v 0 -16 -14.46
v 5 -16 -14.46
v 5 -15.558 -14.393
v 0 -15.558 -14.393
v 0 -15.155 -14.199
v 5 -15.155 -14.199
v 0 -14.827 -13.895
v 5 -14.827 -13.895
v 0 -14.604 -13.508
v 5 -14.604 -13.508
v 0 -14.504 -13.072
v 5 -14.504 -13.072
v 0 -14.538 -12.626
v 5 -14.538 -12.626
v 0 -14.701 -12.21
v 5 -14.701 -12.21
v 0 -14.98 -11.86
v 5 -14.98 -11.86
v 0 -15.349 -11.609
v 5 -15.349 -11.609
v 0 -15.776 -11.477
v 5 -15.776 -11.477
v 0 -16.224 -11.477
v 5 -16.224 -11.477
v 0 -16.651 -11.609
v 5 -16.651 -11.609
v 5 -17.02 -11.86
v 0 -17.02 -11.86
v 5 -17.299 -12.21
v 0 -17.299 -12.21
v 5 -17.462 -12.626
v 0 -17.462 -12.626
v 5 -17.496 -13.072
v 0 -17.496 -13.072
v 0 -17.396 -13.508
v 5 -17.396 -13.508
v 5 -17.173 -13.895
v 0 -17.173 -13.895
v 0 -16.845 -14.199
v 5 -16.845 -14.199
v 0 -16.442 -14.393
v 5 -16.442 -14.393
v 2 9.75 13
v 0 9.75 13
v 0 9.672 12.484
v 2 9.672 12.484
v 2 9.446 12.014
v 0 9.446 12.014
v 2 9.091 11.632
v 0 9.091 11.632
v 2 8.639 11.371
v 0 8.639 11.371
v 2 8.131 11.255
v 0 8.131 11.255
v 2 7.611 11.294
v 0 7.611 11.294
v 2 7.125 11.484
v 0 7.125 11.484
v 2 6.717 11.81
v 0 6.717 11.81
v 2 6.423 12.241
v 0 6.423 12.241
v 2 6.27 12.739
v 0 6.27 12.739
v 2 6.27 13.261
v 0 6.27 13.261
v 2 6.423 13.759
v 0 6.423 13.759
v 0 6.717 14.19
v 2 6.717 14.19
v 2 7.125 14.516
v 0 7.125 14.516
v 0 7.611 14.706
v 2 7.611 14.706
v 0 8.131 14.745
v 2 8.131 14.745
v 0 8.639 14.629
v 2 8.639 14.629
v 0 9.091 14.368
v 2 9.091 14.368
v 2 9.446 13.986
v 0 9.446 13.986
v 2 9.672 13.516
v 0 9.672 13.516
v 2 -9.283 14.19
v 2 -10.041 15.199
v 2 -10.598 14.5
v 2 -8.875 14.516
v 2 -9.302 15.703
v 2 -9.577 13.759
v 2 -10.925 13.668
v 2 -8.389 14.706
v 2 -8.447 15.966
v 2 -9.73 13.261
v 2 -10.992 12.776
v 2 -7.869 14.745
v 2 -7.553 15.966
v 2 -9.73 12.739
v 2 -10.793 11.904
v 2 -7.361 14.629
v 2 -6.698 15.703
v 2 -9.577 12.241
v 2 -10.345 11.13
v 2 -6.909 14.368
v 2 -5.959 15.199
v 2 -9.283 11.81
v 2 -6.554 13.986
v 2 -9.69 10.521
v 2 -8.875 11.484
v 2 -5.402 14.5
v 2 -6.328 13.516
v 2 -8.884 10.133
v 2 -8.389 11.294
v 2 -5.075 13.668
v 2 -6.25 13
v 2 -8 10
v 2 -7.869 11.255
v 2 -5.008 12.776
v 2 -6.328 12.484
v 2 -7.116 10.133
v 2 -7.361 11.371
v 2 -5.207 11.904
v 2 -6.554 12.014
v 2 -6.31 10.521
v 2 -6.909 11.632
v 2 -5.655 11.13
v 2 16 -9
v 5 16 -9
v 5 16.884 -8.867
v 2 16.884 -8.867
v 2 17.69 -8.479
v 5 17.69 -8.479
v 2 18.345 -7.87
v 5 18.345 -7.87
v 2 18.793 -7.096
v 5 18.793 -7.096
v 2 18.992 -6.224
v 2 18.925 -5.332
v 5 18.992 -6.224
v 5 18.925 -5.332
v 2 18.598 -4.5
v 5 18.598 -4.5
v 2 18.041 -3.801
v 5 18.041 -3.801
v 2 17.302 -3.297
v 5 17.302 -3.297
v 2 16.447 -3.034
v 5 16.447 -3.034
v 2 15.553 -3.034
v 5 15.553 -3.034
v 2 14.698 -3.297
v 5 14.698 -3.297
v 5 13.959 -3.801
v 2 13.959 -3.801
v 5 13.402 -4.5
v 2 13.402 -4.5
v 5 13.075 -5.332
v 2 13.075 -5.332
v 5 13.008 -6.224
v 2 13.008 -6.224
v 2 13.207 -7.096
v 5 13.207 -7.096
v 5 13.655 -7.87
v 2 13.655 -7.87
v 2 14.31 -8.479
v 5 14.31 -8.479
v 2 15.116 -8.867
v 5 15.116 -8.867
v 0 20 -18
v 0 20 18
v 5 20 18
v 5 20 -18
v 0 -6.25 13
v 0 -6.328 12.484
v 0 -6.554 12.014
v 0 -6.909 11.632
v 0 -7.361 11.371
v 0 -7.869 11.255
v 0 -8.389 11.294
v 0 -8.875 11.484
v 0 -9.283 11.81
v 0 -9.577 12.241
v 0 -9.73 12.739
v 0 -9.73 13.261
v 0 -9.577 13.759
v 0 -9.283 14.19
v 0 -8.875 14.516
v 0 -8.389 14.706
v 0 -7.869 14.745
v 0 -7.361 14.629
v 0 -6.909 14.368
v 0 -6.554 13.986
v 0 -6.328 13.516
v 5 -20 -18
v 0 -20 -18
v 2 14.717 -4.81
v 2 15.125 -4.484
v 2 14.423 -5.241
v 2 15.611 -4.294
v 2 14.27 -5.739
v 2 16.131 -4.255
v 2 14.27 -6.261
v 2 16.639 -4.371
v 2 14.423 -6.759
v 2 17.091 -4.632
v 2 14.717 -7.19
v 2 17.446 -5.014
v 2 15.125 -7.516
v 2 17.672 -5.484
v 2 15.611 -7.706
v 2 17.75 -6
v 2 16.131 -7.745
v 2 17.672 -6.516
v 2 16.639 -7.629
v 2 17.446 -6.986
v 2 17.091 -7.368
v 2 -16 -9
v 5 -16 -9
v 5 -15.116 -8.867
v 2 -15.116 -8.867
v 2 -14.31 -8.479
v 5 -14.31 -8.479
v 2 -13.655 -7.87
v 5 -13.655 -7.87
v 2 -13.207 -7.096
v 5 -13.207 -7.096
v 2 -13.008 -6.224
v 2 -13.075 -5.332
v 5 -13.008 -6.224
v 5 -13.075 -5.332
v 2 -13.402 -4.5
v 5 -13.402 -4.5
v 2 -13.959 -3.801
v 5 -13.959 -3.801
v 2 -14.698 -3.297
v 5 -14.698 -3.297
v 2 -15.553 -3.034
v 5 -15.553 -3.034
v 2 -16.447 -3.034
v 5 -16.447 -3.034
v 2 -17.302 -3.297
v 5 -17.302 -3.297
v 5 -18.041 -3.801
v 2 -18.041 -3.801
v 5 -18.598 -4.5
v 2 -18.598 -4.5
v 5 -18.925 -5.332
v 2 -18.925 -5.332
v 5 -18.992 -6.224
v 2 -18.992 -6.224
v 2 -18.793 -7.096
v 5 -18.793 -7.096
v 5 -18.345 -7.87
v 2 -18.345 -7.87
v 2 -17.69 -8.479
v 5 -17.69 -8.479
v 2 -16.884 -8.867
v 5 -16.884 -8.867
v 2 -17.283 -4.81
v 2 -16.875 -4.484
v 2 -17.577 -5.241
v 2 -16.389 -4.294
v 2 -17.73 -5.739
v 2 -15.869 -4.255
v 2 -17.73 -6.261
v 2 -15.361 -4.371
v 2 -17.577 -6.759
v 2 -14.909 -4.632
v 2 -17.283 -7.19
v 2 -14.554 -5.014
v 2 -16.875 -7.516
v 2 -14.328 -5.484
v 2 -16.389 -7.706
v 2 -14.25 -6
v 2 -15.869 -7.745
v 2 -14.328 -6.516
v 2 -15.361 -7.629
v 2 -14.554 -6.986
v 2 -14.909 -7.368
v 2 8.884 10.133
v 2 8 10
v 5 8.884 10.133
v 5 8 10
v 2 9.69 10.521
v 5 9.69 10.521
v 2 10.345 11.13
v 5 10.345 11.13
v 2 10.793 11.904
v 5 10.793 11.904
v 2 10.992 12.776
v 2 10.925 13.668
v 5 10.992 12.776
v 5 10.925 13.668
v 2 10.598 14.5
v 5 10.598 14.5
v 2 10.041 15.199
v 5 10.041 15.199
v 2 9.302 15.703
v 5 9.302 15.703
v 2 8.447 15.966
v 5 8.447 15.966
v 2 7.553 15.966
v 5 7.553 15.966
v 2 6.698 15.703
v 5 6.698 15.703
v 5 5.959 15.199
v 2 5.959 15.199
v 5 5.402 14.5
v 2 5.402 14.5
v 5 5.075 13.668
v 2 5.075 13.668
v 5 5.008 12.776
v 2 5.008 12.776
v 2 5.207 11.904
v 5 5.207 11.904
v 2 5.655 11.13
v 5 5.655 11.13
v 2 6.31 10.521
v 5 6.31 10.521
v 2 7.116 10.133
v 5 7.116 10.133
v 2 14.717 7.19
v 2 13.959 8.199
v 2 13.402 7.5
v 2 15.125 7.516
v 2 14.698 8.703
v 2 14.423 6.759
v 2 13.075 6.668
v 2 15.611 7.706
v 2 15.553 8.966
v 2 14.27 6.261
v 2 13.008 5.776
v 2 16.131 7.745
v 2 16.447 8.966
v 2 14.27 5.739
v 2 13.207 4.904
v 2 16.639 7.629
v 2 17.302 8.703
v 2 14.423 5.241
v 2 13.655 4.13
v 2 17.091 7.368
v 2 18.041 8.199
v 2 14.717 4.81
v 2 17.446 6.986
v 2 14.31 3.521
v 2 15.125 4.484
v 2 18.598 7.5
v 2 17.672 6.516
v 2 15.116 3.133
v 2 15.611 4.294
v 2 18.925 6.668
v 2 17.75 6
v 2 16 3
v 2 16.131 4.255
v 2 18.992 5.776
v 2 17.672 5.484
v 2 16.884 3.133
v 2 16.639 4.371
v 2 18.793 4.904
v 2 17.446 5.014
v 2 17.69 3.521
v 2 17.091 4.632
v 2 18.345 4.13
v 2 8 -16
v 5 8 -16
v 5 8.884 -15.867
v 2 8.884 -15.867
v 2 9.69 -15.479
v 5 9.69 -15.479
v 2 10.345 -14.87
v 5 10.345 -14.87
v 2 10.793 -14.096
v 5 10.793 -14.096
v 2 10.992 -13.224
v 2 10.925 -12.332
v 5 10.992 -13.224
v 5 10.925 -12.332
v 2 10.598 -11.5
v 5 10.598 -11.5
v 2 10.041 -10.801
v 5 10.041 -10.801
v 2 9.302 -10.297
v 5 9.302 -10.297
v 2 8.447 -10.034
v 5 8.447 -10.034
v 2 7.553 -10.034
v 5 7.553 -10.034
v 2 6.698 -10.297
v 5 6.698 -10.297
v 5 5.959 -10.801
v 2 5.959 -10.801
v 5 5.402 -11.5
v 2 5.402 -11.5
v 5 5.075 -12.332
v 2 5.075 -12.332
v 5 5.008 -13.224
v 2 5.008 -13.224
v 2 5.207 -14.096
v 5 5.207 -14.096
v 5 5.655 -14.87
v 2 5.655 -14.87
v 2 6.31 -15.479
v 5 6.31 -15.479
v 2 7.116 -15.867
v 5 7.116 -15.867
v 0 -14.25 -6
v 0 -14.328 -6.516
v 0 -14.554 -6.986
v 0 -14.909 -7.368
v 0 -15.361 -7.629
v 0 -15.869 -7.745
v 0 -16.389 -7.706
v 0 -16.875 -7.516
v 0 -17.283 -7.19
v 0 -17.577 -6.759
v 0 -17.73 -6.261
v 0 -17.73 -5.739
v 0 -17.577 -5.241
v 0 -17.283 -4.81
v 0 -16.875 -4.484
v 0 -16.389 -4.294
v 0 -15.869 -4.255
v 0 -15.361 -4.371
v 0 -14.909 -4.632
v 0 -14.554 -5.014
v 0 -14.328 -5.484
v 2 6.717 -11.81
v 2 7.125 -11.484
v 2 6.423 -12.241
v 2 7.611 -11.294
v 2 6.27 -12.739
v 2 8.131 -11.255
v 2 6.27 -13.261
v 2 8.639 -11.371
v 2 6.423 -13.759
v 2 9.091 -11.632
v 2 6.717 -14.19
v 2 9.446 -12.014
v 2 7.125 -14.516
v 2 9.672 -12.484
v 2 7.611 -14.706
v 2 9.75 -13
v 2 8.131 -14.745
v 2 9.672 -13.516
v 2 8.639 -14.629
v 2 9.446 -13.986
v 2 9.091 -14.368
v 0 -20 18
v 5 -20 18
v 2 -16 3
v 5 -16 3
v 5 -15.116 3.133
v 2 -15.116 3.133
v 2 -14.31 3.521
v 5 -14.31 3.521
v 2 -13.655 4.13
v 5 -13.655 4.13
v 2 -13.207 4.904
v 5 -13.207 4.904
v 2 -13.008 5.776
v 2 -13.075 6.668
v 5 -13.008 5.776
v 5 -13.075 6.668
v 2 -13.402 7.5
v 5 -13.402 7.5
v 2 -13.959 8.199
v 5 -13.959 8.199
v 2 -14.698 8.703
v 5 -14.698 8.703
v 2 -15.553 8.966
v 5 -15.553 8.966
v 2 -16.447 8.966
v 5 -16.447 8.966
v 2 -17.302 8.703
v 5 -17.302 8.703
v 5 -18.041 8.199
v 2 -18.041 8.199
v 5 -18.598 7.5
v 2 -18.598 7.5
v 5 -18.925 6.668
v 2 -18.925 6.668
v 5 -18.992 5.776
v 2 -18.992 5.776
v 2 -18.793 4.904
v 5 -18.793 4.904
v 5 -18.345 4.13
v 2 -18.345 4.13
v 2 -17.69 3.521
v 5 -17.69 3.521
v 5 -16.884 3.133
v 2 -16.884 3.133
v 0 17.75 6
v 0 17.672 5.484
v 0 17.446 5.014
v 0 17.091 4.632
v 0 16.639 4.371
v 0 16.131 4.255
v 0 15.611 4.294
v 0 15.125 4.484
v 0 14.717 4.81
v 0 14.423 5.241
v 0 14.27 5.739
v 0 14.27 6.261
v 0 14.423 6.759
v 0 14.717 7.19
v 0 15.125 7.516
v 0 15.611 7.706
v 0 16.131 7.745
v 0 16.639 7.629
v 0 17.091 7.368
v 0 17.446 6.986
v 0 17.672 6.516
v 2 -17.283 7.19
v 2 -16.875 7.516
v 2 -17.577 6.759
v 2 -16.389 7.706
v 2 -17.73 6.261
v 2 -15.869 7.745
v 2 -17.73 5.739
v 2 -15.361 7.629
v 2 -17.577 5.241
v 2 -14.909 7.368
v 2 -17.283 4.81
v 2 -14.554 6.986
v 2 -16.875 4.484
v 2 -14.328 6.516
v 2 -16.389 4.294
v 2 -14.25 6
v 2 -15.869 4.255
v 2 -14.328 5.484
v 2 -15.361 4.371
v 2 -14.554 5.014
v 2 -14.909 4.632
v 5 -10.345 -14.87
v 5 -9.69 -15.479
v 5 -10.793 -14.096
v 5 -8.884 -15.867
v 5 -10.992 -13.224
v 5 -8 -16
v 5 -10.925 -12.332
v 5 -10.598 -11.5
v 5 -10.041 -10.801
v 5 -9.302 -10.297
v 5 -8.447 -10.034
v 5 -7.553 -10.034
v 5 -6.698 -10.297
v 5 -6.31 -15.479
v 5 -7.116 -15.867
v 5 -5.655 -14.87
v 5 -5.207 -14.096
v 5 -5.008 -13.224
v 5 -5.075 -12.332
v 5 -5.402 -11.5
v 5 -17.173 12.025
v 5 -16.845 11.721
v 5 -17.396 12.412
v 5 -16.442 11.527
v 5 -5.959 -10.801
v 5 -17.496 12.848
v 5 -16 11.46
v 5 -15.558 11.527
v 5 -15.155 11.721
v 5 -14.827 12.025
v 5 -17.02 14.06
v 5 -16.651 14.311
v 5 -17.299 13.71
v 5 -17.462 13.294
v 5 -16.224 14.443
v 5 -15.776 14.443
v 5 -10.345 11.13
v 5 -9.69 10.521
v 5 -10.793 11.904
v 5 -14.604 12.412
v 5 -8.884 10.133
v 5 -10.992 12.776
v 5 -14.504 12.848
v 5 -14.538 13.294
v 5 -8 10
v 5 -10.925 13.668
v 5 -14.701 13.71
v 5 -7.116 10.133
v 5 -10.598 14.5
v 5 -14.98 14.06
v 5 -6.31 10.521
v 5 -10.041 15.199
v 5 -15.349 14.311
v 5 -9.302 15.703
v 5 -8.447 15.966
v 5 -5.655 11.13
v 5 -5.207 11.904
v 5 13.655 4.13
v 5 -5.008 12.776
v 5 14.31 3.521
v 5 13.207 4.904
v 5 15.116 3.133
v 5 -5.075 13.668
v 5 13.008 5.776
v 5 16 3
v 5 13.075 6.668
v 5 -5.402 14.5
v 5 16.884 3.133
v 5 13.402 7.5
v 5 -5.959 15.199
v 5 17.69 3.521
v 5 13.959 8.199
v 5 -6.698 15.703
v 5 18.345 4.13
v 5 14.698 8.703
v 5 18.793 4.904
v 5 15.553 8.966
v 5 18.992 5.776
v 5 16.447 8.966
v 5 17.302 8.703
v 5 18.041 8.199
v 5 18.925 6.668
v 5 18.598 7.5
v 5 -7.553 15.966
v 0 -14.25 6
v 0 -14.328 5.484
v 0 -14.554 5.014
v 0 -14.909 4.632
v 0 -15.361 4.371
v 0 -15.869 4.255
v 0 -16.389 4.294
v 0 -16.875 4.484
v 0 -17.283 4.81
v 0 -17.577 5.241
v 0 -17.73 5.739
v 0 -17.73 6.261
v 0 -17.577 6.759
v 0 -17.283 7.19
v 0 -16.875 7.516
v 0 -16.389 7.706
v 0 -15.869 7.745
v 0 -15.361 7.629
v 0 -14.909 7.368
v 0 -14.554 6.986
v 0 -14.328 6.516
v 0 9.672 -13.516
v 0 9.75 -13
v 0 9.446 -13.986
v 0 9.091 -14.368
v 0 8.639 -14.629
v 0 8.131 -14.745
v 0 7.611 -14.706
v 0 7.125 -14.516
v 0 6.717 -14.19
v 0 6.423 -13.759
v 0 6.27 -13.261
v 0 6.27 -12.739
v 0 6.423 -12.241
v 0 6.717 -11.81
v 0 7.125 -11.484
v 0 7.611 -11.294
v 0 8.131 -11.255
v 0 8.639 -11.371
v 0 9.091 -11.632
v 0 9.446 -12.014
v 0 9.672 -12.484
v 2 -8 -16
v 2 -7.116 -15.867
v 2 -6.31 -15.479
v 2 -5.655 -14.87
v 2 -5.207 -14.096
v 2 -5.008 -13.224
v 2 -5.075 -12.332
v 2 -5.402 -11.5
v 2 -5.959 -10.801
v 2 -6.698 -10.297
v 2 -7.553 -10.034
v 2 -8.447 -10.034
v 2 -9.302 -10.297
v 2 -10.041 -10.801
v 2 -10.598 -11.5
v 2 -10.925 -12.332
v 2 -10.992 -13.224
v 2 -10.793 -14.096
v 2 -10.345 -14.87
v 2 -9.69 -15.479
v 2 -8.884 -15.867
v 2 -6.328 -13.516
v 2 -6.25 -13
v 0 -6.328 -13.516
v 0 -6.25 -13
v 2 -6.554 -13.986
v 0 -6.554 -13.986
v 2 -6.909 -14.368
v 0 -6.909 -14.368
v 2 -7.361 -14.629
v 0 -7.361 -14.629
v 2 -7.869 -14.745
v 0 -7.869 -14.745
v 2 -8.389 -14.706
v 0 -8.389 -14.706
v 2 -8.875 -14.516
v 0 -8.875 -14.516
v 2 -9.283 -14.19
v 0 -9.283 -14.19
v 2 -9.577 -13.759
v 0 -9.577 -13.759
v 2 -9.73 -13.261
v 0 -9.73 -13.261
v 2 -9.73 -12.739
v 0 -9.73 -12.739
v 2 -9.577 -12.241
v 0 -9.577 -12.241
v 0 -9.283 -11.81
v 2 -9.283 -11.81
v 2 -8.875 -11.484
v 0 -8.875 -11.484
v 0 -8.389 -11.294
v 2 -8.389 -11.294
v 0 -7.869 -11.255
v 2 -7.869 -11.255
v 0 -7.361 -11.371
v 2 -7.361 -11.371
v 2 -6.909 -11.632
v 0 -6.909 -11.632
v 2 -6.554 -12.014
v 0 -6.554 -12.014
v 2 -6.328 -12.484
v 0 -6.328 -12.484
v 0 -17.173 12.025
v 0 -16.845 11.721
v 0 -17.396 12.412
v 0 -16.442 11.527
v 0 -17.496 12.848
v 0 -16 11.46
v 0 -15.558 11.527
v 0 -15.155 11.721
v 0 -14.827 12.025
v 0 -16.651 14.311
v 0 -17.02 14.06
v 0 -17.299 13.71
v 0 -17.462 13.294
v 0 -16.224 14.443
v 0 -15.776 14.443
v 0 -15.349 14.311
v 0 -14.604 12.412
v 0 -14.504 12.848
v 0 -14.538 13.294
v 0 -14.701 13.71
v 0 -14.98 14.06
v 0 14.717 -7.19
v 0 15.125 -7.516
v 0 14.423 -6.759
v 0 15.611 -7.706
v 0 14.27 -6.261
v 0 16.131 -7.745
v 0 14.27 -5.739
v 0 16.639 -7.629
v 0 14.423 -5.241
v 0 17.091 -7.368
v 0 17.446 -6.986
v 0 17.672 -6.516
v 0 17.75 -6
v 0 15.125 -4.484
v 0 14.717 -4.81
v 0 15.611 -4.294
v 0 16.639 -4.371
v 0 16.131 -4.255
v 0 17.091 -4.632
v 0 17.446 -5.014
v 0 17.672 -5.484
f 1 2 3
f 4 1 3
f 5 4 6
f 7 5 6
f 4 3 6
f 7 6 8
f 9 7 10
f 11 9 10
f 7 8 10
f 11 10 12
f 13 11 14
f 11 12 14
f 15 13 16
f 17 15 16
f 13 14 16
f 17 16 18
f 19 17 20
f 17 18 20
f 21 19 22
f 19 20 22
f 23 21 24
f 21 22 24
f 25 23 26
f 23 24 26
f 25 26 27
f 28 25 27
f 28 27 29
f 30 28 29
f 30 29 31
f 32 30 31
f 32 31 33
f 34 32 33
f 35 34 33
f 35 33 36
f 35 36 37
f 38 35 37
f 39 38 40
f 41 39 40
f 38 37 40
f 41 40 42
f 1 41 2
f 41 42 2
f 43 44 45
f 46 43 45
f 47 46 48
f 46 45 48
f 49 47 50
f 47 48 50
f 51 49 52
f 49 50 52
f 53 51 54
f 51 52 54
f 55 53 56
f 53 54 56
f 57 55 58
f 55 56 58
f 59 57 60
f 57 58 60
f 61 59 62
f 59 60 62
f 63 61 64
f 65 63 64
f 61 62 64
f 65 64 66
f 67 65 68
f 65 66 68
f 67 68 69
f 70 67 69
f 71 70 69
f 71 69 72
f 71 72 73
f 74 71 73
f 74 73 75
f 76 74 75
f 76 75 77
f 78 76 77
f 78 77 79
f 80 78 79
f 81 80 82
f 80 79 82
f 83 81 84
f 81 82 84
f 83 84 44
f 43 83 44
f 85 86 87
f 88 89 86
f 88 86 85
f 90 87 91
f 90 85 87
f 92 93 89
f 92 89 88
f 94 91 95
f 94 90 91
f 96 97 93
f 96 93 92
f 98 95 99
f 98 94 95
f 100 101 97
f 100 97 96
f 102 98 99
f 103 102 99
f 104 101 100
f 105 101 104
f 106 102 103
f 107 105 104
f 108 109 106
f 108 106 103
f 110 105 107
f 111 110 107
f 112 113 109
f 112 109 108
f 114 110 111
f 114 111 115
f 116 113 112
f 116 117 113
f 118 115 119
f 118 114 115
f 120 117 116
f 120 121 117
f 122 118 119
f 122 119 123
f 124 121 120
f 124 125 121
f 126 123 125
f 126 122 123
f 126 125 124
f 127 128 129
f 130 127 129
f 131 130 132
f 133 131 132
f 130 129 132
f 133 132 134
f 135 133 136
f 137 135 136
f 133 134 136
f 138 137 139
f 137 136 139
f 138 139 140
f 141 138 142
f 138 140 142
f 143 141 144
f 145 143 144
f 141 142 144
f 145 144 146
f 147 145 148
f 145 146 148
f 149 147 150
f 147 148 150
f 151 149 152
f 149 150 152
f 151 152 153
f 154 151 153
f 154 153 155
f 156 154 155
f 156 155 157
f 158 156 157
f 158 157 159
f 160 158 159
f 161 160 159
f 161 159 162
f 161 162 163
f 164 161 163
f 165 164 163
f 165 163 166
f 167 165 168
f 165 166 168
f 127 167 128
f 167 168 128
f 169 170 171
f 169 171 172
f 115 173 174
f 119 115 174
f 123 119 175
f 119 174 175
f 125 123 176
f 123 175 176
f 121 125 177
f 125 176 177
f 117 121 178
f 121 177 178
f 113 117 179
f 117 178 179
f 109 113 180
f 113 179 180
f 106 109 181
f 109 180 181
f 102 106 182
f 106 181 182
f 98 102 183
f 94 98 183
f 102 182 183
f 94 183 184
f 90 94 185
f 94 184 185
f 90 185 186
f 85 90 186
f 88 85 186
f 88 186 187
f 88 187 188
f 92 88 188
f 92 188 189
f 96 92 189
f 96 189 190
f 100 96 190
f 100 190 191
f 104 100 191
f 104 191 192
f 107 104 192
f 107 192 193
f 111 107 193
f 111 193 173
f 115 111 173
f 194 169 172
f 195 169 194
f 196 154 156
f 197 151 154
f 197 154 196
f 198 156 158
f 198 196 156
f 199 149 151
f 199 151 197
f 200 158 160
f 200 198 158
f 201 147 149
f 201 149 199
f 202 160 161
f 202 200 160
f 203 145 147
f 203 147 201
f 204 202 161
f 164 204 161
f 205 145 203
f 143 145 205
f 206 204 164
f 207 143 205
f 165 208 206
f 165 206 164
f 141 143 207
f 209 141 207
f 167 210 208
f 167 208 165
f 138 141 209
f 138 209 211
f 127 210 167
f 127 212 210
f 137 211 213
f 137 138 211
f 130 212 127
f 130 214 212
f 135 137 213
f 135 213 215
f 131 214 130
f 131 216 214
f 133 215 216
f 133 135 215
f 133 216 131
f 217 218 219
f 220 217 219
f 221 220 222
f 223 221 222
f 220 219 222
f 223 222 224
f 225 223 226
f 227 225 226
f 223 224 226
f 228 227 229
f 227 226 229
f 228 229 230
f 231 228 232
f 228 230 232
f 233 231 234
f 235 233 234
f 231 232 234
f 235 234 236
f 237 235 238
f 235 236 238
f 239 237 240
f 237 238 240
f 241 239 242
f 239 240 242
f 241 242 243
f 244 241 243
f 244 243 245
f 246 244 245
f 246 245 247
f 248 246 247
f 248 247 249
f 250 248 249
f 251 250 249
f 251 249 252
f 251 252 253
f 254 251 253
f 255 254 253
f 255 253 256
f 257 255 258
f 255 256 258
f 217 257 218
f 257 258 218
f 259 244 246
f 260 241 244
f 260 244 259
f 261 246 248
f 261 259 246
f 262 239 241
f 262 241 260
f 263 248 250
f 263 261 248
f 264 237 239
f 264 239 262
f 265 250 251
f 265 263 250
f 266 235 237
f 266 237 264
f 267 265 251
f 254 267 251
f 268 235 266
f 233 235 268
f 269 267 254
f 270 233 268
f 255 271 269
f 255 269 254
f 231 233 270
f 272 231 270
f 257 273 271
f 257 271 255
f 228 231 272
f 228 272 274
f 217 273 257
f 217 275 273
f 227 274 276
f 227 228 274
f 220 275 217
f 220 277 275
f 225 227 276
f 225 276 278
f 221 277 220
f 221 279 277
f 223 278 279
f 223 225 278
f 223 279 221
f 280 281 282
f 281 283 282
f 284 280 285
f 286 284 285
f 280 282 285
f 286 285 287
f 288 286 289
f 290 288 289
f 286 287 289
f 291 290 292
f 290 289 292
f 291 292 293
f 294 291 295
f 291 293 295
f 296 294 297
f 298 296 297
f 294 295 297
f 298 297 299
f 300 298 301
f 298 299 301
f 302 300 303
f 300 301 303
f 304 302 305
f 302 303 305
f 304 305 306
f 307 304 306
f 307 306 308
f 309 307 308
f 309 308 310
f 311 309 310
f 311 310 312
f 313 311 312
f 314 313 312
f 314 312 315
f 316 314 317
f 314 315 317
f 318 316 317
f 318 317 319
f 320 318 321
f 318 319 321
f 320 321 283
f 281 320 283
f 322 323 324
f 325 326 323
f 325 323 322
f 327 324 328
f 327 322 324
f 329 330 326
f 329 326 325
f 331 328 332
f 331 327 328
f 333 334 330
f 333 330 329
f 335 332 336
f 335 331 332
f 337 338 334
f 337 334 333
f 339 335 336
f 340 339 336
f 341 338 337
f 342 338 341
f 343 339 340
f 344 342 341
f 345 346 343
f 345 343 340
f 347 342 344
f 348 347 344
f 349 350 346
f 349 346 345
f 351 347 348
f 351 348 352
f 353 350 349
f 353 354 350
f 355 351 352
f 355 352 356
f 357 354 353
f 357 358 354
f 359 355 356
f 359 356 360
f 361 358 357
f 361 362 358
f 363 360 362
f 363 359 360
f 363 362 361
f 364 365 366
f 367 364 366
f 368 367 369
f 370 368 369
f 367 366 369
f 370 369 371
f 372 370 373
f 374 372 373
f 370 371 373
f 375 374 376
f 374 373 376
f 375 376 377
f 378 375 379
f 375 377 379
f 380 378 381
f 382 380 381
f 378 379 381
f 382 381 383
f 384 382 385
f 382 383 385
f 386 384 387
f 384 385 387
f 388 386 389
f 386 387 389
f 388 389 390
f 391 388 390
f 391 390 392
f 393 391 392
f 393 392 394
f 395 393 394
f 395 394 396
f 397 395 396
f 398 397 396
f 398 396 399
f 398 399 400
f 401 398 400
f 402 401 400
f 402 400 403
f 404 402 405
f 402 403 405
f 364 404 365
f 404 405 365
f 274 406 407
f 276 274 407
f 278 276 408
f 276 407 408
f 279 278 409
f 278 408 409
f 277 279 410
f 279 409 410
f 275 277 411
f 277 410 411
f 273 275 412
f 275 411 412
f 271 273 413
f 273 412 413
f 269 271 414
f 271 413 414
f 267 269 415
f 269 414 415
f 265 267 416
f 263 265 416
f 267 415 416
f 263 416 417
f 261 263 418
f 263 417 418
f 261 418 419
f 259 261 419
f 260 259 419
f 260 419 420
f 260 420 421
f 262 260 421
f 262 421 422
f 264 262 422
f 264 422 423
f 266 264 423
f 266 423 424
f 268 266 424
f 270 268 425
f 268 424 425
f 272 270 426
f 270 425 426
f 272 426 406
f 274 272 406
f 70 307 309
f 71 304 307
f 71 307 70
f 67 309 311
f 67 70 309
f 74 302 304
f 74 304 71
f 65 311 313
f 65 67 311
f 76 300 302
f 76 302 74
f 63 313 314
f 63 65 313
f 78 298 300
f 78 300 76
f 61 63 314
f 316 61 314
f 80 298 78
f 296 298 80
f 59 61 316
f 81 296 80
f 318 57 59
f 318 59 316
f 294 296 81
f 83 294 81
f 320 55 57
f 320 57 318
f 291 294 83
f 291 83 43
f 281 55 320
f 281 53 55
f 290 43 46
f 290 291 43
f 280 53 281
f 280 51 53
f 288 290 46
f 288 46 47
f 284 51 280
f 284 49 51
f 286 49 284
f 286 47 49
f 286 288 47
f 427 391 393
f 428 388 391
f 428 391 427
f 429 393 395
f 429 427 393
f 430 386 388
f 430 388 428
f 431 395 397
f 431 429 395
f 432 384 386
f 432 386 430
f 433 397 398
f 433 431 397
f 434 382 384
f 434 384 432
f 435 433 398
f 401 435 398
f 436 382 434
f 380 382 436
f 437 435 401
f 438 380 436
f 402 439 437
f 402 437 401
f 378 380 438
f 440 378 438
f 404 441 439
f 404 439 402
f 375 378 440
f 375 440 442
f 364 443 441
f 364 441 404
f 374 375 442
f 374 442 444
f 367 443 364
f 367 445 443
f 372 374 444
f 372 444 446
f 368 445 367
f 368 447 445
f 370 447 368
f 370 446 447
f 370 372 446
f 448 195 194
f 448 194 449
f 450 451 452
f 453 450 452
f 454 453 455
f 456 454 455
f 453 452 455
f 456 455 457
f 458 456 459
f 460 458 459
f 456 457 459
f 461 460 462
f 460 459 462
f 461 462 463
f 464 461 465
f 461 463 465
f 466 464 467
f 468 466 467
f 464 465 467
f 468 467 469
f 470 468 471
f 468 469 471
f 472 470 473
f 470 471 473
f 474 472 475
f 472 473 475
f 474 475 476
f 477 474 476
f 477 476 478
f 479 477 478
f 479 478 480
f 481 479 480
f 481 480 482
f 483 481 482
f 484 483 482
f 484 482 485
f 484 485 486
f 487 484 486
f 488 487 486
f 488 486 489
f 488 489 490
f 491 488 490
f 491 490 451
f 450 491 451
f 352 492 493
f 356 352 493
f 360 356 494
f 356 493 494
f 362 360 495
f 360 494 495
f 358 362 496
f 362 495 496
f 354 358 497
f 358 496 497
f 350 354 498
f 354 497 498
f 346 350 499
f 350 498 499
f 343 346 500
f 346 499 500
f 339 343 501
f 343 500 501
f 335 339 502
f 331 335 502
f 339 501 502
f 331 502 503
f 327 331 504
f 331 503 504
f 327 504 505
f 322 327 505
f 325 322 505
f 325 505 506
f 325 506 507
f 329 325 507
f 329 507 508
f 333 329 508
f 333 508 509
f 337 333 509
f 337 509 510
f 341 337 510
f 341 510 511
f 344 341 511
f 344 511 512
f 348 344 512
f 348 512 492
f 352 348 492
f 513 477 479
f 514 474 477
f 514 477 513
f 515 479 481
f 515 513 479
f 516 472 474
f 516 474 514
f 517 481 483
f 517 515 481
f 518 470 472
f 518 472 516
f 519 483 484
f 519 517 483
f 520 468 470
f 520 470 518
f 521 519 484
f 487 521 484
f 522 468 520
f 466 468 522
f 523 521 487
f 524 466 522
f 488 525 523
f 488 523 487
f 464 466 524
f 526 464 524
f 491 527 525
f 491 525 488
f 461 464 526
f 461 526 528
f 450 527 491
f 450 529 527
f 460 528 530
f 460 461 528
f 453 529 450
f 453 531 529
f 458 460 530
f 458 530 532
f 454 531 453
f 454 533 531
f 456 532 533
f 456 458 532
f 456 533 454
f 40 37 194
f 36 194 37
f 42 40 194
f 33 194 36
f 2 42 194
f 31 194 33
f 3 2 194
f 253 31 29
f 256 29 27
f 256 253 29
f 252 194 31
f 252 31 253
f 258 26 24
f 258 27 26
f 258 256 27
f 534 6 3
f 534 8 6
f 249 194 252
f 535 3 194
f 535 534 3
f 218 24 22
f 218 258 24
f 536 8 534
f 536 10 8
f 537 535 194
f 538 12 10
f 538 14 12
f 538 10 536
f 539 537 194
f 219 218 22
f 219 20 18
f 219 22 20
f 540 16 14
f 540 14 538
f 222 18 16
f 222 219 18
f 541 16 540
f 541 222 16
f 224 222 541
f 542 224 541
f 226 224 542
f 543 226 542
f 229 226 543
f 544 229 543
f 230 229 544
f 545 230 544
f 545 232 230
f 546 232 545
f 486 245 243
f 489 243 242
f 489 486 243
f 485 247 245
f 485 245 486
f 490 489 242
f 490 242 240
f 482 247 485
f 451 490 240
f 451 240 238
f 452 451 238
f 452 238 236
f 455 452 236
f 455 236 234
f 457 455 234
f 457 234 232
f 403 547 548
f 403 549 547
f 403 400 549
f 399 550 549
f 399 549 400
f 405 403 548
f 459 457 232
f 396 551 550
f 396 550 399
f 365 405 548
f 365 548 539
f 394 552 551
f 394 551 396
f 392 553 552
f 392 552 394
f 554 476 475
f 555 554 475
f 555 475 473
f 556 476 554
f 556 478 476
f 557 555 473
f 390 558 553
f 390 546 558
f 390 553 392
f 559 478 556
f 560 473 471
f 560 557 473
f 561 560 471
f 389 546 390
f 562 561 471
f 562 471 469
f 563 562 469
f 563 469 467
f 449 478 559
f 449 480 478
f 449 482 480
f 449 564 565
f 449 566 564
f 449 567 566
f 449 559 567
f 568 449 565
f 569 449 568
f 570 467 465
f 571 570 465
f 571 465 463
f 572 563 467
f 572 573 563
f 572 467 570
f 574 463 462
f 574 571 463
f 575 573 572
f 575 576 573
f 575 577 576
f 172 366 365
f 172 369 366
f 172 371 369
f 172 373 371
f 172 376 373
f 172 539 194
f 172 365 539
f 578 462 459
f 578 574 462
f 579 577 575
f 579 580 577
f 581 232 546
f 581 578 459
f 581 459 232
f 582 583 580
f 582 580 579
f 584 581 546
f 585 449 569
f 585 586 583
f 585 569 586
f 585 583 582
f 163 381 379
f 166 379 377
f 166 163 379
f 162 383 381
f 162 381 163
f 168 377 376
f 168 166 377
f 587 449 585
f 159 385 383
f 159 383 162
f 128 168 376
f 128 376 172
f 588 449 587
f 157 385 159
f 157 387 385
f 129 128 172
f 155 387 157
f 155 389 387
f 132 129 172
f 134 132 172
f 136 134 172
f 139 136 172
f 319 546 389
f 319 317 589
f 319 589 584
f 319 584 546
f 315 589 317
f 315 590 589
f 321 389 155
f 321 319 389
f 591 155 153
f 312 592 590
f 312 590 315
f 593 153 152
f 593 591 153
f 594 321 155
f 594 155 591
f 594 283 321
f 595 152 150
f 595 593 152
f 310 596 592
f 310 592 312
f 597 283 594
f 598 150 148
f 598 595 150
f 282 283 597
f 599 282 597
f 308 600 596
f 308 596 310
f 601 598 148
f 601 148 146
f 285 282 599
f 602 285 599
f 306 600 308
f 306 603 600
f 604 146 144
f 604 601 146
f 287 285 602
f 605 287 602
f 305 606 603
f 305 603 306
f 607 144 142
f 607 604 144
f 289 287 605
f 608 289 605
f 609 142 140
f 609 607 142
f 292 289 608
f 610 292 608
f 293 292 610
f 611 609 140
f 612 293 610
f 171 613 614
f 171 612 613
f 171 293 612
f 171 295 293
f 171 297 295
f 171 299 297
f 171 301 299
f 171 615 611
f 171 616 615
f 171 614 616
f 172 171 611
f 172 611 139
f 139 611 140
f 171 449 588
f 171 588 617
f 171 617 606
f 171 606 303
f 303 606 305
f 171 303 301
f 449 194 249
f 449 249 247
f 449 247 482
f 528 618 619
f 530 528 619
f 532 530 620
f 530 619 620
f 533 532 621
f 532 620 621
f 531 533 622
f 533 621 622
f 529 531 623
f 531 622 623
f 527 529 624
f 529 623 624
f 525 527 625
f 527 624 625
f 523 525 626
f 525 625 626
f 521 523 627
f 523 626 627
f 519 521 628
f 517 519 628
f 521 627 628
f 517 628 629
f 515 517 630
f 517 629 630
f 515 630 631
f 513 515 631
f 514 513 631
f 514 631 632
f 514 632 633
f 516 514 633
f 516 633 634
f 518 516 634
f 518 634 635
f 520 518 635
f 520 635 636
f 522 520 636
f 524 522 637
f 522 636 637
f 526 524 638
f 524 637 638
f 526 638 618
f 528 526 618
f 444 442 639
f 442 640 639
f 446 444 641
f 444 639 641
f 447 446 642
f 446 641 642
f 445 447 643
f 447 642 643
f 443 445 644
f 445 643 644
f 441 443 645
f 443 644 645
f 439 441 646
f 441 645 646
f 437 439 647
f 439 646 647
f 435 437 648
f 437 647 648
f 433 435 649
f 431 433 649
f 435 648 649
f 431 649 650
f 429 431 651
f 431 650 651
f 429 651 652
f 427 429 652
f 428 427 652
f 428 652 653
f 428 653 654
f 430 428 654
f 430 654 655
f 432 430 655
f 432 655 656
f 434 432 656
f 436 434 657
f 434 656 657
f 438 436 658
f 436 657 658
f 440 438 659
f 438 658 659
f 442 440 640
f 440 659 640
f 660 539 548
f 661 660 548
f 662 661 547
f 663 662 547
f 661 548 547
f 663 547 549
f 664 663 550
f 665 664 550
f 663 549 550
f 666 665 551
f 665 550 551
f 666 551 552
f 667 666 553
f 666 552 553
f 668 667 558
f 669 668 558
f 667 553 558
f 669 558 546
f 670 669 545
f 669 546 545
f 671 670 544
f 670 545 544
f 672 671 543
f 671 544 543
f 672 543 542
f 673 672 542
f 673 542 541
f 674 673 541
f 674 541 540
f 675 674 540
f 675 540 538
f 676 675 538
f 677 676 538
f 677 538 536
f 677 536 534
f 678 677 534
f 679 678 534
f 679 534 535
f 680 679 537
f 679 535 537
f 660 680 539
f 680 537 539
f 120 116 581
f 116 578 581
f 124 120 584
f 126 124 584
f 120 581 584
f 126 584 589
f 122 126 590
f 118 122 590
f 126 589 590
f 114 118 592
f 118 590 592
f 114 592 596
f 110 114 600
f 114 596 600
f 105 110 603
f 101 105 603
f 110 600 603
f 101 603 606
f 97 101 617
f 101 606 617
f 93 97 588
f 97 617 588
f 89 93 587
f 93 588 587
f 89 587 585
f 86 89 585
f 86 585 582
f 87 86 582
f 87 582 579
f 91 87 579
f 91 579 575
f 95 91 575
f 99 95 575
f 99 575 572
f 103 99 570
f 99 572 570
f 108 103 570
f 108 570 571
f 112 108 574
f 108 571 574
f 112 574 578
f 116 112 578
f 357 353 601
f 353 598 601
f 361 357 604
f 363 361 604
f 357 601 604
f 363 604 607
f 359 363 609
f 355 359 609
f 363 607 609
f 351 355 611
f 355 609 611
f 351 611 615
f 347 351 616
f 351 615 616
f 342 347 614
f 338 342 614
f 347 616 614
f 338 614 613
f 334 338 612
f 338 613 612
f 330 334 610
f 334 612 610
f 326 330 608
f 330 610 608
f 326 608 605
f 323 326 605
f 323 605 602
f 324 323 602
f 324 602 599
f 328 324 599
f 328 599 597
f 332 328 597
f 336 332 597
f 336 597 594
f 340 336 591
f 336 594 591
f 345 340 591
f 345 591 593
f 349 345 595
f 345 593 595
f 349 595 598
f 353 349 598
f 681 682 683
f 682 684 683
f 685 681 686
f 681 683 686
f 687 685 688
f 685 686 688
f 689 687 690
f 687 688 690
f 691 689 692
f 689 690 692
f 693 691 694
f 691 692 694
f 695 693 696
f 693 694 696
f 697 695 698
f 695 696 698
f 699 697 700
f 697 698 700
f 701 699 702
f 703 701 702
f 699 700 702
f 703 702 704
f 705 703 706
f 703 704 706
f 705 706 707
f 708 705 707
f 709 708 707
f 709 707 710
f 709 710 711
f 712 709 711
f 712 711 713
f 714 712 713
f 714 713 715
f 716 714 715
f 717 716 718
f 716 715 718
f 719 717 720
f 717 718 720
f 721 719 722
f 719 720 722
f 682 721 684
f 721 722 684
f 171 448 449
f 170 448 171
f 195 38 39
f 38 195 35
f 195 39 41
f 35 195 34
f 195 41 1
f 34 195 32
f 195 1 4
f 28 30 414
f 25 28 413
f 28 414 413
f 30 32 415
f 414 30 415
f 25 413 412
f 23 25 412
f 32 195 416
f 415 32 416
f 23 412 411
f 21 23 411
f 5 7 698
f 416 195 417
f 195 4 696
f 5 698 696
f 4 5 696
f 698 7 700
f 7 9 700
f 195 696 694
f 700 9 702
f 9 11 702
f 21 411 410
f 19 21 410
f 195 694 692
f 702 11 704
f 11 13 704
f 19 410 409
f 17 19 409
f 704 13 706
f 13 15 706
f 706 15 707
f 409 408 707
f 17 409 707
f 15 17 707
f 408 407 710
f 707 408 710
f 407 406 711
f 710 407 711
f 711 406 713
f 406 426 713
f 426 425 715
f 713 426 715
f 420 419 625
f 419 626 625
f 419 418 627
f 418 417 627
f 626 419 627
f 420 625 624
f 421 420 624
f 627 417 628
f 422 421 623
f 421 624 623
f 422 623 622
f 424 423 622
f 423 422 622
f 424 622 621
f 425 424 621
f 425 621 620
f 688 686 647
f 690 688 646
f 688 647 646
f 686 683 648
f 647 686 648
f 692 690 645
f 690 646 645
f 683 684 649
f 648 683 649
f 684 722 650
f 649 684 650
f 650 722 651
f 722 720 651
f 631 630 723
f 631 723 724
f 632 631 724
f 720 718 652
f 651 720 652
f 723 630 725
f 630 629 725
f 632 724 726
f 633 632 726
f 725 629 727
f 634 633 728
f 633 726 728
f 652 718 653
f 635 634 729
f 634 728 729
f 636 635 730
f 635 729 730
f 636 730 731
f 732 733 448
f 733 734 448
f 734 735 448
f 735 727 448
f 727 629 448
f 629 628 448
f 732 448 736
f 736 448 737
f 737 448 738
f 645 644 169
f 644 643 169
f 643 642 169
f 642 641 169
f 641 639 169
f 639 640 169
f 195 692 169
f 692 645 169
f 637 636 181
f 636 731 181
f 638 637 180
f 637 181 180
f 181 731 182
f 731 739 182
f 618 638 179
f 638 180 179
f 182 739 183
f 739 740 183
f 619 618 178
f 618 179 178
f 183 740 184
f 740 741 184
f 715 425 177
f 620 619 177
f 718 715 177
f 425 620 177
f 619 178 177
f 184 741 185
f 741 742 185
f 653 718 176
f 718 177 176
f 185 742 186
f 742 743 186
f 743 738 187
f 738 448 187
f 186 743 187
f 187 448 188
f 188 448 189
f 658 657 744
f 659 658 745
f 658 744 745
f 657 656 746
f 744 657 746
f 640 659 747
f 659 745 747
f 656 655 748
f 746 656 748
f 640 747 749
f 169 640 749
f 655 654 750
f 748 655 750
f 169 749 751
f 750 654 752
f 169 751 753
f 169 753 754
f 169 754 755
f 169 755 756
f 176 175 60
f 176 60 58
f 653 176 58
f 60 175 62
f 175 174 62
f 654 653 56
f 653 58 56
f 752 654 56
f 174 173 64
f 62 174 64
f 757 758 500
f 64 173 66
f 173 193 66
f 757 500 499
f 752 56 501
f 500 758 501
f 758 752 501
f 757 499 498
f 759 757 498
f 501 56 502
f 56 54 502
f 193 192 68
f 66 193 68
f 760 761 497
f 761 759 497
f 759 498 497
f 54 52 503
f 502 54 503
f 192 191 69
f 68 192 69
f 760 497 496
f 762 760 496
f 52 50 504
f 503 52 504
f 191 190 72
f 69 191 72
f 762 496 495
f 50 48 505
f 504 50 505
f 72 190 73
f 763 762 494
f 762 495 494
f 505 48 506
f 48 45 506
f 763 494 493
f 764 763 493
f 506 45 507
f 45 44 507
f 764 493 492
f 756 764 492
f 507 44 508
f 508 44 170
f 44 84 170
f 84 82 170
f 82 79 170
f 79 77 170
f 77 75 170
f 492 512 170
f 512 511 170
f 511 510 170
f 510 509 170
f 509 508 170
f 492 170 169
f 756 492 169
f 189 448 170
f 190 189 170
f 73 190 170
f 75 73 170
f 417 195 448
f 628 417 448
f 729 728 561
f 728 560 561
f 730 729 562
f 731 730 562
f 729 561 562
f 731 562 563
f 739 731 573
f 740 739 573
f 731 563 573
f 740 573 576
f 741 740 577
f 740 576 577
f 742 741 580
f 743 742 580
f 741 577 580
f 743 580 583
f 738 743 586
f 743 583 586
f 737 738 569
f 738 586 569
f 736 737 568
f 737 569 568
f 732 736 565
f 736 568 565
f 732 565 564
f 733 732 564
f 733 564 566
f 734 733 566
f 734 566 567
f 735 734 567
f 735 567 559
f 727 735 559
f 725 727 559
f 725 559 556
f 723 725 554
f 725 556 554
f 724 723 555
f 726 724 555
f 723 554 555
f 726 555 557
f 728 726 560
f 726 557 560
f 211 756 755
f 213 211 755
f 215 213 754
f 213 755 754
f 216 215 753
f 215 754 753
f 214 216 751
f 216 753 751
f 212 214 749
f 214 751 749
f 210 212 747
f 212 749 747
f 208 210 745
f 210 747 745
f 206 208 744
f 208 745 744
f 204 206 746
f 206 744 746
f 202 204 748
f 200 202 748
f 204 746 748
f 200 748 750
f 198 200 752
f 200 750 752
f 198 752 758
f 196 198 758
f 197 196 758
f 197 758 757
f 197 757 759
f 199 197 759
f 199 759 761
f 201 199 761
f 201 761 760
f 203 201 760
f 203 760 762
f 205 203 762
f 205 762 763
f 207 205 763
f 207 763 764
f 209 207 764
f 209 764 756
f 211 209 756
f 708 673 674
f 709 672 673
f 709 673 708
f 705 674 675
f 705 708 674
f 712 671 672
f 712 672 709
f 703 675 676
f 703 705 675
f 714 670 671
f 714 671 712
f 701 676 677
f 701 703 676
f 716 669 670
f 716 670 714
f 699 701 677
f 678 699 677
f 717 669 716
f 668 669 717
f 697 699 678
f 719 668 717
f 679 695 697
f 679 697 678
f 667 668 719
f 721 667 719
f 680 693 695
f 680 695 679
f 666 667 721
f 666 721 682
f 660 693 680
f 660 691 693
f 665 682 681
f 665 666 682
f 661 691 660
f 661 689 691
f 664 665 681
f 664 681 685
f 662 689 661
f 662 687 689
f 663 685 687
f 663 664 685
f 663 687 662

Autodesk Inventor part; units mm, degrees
ref_plane "YZ Plane" through (0, 0, 0) normal (1, 0, 0) x (0, 1, 0)
ref_plane "XZ Plane" through (0, 0, 0) normal (0, 1, 0) x (-1, 0, 0)
ref_plane "XY Plane" through (0, 0, 0) normal (0, 0, 1) x (1, 0, 0)
sketch "Sketch1" plane through (0, 0, 0) normal (1, 0, 0) x (0, 1, 0)
  line L0 (-20, 18) -> (20, 18)
  line L1 (20, 18) -> (20, -18)
  line L2 (20, -18) -> (-20, -18)
  line L3 (-20, -18) -> (-20, 18)
  line L4 (-20, 18) -> (20, -18) construction
  line L5 (20, 18) -> (-20, -18) construction
  circle A0 centre (8, 13) radius 1.75
  circle A1 centre (8, -13) radius 1.75
  line L6 (20, 0) -> (-20, 0) construction
  line L7 (0, 18) -> (0, -18) construction
  circle A2 centre (16, 6) radius 1.75
  circle A3 centre (16, -6) radius 1.75
  circle A4 centre (-8, 13) radius 1.75
  circle A5 centre (-8, -13) radius 1.75
  circle A6 centre (-16, 6) radius 1.75
  circle A7 centre (-16, -6) radius 1.75
  point P0 (0, 0)
  dimension "d0" = 40
  dimension "d1" = 36
  dimension "d2" = 3.5
  dimension "d3" = 3.5
  dimension "d4" = 13
  dimension "d5" = 13
  dimension "d6" = 8
  dimension "d7" = 8
  dimension "d8" = 3.5
  dimension "d9" = 4
  dimension "d10" = 6
  dimension "d11" = 3.5
  dimension "d12" = 6
  dimension "d13" = 4
extrude "Extrusion1" add sketch "Sketch1" along normal blind 5
sketch "Sketch2" plane through (5, 0, 0) normal (1, 0, 0) x (0, 0, -1)
  circle A0 centre (-13, 8) radius 1.75 construction
  line L0 (-13, 9.75) -> (-13, 8) construction
  circle A1 centre (-13, 8) radius 3
  circle A2 centre (-6, 16) radius 1.75 construction
  line L1 (-6, 17.75) -> (-6, 16) construction
  circle A3 centre (6, 16) radius 1.75 construction
  line L2 (-6, 16) -> (6, 16) construction
  circle A4 centre (13, 8) radius 1.75 construction
  line L3 (6, 16) -> (13, 8) construction
  circle A5 centre (-6, 16) radius 3
  circle A6 centre (6, 16) radius 3
  circle A7 centre (13, 8) radius 3
  line L4 (-18, 20) -> (-18, -20) construction
  line L5 (-18, 0) -> (18, 0) construction
  line L6 (18, 20) -> (18, -20) construction
  circle A8 centre (-13, -8) radius 3
  circle A9 centre (-6, -16) radius 3
  circle A10 centre (6, -16) radius 3
  circle A11 centre (13, -8) radius 3
  point P0 (0, 0)
  dimension "d16" = 6
  dimension "d17" = 6
  dimension "d18" = 6
  dimension "d19" = 6
extrude "Extrusion2" cut sketch "Sketch2" against normal blind 3
sketch "Sketch3" plane through (5, 0, 0) normal (1, 0, 0) x (0, 0, -1)
  circle A0 centre (-12.96, -16) radius 1.5
  circle A1 centre (12.96, -16) radius 1.5
  line L0 (0, 0) -> (0, -23.2613) construction
  line L1 (-18, -20) -> (18, -20) construction
  dimension "d22" = 3
  dimension "d23" = 3
  dimension "d24" = 12.96
  dimension "d25" = 12.96
  dimension "d26" = 4
  dimension "d27" = 4
extrude "Extrusion3" cut sketch "Sketch3" against normal blind 5
properties part number "Steam Chest Cover" material "Iron, Cast"
